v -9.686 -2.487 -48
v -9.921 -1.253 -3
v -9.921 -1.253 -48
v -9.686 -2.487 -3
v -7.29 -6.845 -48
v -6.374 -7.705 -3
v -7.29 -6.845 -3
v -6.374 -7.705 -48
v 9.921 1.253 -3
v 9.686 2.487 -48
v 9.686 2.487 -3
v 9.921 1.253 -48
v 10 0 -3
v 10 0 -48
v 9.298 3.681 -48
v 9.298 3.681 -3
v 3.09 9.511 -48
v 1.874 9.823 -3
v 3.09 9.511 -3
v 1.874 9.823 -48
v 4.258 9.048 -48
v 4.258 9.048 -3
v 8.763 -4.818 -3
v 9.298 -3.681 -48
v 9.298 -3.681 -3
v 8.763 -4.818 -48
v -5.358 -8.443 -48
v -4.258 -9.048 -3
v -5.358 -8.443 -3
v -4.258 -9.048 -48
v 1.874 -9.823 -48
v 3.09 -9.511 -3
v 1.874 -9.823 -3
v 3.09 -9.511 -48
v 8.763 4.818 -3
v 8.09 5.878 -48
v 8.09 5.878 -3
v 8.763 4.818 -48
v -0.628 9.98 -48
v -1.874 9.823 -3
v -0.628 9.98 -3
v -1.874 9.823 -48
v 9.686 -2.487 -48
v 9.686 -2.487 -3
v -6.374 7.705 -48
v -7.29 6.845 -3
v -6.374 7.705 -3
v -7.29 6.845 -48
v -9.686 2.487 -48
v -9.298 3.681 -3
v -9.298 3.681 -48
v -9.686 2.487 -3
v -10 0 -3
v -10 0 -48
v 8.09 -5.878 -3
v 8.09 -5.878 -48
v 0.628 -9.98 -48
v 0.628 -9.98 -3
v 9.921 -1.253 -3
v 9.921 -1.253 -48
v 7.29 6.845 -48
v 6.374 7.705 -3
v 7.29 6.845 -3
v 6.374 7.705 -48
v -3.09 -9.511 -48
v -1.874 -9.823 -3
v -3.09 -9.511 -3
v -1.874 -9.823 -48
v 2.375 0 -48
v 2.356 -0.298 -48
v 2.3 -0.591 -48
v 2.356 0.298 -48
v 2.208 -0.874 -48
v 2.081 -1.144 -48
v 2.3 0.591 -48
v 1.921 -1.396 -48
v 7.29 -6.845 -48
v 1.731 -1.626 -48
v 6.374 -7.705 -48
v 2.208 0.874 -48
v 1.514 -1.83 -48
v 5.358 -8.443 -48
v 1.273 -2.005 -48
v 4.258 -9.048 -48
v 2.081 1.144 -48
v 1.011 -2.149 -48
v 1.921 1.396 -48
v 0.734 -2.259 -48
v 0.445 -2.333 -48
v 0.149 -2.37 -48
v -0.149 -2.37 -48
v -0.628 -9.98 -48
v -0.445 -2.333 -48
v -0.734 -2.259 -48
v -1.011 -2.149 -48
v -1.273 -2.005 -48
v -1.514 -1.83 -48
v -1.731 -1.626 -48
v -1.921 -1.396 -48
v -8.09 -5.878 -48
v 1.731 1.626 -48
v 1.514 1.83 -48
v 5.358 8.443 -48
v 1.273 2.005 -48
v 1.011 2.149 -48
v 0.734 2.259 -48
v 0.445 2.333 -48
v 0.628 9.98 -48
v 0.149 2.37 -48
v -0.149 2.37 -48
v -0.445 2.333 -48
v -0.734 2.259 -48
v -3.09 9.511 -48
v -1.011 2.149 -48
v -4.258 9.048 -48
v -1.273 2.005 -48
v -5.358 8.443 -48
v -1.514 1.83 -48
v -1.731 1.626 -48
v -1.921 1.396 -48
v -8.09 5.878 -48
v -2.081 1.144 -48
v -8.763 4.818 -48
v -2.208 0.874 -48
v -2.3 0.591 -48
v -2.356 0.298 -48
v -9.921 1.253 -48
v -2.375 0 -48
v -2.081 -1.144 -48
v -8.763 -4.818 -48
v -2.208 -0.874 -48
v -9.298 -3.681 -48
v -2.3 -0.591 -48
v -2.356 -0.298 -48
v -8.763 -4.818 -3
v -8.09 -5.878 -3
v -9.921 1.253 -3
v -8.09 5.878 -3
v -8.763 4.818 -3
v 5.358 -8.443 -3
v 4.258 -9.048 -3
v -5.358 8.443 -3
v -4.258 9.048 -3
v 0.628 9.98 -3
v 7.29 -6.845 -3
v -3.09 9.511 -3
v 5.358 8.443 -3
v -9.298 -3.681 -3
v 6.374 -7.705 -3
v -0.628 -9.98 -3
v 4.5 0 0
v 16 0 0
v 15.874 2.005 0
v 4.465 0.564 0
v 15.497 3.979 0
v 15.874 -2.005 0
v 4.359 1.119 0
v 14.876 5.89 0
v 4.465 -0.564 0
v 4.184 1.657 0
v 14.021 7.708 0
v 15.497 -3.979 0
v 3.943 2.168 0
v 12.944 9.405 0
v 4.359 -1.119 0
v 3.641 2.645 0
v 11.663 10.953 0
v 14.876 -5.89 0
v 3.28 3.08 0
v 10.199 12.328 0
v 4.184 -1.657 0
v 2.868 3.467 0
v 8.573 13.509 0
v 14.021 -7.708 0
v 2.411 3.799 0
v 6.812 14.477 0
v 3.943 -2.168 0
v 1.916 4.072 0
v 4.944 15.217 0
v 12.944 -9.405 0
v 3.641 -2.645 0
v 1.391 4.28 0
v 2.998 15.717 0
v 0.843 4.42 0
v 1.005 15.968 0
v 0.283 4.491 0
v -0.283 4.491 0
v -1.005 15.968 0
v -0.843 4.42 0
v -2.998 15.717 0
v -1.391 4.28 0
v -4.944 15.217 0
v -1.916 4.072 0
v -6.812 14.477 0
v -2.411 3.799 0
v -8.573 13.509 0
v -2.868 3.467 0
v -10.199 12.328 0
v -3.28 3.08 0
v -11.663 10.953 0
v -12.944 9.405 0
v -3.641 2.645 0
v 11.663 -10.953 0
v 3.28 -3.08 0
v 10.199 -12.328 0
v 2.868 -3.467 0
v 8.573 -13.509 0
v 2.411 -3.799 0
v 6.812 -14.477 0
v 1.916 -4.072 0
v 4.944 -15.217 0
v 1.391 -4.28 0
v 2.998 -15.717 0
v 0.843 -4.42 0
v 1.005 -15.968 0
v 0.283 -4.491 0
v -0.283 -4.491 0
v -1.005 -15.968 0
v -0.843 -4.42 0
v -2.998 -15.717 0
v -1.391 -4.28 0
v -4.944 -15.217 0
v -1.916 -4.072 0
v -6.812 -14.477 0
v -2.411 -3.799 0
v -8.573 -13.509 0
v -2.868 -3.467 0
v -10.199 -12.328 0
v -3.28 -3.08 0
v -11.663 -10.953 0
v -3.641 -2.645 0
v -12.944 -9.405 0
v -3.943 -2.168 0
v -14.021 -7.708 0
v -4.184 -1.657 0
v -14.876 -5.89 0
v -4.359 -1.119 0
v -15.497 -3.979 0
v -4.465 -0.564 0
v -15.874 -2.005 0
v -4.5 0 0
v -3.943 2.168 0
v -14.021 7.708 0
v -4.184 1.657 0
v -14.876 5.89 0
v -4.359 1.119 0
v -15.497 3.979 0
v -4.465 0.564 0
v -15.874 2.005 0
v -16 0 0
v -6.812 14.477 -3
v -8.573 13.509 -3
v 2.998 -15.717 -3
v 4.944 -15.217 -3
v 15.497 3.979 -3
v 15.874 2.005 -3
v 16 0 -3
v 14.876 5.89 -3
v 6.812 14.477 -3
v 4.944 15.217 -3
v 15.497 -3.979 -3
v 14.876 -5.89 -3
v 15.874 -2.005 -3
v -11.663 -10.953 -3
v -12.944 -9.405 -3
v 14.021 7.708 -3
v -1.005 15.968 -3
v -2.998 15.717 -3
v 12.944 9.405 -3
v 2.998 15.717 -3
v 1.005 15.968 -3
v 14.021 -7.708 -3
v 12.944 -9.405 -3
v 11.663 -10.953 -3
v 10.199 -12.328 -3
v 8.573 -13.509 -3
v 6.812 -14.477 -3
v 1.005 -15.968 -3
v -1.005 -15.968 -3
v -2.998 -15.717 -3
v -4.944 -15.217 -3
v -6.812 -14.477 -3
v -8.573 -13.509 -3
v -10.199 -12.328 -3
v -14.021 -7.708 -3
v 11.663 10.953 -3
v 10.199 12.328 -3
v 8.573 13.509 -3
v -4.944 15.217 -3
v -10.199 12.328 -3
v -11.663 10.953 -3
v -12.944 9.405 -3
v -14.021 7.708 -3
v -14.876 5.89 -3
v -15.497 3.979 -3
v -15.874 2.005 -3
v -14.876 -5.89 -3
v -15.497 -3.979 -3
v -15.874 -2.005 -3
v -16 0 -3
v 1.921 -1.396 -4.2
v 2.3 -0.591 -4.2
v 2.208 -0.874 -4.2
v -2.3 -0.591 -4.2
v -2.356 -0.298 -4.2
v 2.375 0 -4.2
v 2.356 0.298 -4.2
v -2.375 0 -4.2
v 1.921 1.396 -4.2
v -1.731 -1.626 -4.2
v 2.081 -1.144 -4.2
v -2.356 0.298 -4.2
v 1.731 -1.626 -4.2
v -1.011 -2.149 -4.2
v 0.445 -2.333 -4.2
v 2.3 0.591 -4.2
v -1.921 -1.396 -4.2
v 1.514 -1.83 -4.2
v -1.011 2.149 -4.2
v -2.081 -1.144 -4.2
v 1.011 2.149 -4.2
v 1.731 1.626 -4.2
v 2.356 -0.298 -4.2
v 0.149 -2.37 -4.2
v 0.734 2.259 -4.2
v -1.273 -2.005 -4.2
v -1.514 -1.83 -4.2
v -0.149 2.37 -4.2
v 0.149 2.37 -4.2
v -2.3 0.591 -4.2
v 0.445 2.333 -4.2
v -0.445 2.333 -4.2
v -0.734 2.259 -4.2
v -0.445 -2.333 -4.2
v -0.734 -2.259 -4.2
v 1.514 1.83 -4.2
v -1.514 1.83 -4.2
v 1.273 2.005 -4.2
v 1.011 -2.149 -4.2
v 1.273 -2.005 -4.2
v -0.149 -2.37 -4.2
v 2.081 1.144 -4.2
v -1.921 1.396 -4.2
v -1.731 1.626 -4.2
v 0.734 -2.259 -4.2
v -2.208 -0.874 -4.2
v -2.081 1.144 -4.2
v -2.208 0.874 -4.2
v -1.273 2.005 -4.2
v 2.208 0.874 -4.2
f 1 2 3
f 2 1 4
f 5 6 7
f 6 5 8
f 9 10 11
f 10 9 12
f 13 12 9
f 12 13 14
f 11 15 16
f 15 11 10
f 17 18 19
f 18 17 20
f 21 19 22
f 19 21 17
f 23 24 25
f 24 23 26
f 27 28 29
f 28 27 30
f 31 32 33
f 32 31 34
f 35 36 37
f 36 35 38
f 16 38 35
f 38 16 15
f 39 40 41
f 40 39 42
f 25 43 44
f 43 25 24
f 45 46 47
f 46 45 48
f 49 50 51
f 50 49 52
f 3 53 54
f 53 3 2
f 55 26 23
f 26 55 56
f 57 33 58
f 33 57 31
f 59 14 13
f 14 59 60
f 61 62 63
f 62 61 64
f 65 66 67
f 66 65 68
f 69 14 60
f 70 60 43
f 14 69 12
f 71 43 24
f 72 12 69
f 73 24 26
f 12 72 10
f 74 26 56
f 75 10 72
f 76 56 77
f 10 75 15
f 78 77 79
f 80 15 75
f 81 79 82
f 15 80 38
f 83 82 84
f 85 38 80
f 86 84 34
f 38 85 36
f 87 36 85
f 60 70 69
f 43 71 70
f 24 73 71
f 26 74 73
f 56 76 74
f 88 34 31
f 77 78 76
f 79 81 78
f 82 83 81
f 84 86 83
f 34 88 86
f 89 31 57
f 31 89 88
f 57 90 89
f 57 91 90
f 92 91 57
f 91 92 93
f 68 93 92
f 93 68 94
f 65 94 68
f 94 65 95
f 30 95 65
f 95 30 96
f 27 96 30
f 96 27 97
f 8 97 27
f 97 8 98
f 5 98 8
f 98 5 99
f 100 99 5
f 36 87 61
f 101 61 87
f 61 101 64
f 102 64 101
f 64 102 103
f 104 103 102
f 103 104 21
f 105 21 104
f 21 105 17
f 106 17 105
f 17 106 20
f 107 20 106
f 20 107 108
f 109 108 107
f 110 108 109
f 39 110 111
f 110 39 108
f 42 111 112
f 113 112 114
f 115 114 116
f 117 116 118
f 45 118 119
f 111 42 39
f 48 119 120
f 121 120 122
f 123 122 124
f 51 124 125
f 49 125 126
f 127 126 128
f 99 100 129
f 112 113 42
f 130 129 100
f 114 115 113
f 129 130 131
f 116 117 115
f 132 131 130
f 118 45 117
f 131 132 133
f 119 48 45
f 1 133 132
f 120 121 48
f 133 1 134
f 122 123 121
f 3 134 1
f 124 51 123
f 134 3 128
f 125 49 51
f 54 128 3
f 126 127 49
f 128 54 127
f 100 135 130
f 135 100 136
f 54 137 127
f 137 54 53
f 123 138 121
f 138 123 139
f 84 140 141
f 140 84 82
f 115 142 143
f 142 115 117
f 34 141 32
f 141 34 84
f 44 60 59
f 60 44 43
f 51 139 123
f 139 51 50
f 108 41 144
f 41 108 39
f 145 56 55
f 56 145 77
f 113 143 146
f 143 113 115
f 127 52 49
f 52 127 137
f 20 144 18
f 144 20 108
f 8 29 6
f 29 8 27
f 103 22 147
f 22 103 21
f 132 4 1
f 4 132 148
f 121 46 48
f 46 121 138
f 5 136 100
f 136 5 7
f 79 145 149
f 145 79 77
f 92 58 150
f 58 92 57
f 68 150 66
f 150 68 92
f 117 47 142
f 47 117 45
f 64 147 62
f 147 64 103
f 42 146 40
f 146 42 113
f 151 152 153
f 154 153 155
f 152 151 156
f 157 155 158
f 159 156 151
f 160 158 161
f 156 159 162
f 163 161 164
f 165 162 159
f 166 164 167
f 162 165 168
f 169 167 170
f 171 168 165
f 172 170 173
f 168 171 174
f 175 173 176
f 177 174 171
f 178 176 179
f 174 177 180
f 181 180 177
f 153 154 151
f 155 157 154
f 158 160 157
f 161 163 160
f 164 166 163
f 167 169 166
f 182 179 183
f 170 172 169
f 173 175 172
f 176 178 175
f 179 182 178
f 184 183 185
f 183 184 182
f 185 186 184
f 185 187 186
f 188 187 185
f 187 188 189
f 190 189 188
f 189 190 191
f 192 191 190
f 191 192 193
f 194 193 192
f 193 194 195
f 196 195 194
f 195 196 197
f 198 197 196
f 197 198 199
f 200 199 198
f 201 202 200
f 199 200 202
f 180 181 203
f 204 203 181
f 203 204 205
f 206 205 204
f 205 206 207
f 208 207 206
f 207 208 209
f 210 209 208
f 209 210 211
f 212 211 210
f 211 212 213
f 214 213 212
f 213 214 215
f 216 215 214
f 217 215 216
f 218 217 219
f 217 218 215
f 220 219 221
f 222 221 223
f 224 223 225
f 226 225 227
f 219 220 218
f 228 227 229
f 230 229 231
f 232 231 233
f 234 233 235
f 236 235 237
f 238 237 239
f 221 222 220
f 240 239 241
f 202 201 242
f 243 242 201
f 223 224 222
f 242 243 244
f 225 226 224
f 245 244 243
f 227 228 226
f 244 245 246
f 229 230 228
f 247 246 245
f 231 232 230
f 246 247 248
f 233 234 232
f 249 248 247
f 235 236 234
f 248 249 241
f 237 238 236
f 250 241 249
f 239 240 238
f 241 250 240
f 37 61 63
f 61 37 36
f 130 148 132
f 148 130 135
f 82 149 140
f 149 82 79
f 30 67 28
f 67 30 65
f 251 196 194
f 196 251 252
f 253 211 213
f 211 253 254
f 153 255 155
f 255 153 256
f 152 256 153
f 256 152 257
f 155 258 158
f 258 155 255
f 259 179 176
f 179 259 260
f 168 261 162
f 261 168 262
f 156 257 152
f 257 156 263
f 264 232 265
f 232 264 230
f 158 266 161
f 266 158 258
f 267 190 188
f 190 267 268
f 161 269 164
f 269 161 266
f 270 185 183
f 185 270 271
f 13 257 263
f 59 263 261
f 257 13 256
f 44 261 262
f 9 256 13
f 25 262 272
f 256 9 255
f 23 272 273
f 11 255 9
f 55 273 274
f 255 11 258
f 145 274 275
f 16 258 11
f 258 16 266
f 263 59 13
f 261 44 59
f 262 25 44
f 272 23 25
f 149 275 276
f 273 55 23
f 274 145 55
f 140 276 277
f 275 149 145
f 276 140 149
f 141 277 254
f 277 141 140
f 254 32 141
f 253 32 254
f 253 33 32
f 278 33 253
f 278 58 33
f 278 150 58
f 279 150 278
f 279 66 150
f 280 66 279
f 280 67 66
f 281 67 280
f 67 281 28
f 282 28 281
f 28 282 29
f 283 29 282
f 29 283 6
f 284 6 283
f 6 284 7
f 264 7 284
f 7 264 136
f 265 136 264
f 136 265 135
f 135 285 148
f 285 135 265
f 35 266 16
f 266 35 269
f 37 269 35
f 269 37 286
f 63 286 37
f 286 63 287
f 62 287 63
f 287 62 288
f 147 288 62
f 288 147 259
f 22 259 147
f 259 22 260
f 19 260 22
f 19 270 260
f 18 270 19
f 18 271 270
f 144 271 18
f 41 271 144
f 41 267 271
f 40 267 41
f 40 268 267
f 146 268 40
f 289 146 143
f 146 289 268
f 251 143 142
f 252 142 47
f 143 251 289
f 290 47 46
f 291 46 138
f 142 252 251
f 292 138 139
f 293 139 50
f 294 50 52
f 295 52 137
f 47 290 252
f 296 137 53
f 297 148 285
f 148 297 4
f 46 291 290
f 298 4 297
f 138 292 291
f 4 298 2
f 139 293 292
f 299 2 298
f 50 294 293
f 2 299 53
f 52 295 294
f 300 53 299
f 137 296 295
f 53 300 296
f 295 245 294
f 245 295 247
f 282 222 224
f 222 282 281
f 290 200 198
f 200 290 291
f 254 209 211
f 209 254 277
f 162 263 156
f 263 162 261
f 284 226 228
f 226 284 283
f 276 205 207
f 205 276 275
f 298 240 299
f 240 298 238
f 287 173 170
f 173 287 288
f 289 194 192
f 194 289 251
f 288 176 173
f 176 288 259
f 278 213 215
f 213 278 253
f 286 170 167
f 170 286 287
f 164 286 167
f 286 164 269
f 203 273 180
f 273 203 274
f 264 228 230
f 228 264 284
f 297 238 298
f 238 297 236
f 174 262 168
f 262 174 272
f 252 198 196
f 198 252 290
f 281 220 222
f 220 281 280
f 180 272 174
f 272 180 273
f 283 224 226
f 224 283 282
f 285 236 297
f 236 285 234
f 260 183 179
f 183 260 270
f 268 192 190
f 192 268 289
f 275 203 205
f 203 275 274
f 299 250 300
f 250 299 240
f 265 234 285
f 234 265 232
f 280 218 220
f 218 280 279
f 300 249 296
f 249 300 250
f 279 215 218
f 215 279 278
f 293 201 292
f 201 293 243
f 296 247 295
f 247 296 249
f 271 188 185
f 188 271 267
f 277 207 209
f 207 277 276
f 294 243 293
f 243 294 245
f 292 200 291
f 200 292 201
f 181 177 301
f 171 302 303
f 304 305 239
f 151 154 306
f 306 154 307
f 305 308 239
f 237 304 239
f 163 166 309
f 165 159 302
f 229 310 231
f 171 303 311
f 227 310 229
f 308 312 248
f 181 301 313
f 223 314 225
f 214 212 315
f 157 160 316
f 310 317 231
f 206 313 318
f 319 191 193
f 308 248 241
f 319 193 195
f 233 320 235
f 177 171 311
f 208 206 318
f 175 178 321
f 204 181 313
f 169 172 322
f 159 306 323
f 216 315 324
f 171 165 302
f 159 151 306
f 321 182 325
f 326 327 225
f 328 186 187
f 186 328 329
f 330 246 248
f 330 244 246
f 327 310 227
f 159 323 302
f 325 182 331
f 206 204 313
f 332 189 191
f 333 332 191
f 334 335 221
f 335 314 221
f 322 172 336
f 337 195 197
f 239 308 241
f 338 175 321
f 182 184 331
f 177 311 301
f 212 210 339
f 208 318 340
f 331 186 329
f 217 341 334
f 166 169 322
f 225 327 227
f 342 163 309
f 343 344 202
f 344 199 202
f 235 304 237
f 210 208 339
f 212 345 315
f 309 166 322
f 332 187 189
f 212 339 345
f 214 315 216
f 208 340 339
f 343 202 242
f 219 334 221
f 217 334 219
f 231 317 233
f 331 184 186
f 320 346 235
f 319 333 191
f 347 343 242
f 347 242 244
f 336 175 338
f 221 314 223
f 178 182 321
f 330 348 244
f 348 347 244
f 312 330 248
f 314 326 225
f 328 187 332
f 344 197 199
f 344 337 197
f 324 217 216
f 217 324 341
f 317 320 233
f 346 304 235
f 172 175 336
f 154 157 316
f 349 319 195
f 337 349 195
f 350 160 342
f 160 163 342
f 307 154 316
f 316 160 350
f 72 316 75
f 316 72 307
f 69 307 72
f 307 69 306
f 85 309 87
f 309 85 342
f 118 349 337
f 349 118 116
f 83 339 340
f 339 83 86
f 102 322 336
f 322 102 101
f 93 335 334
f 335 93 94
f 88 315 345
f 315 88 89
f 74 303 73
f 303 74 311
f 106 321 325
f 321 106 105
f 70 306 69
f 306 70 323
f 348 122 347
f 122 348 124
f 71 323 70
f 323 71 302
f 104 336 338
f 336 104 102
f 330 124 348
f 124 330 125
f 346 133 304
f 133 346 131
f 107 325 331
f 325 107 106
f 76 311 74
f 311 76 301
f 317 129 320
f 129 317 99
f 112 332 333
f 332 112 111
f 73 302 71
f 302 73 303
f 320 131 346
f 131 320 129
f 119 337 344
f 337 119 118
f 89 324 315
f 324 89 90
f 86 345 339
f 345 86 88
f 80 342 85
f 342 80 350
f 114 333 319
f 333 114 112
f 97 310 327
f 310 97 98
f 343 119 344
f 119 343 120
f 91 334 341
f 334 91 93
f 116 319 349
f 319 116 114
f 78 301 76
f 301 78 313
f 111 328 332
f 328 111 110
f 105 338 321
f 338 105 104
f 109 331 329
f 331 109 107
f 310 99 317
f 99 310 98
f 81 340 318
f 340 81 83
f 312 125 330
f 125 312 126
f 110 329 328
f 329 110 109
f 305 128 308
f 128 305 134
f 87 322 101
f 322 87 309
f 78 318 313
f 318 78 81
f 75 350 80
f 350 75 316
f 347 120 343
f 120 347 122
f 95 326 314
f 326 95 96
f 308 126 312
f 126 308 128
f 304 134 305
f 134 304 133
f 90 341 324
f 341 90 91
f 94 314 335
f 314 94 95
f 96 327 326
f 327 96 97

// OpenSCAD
$fn = 50;


difference() {
	union() {
		translate(v = [0, 0, -48.0000000000]) {
			cylinder(h = 48, r = 10.0000000000);
		}
		translate(v = [0, 0, -3.0000000000]) {
			cylinder(h = 3, r = 16.0000000000);
		}
	}
	union() {
		translate(v = [0, 0, 0]) {
			rotate(a = [0, 0, 0]) {
				difference() {
					union() {
						#translate(v = [0, 0, -48.0000000000]) {
							cylinder(h = 48, r = 2.2500000000);
						}
						#translate(v = [0, 0, -4.2000000000]) {
							cylinder(h = 4.2000000000, r = 10.0000000000, r1 = 2.3750000000, r2 = 4.5000000000);
						}
						#translate(v = [0, 0, -48.0000000000]) {
							cylinder(h = 48, r = 2.3750000000);
						}
						#translate(v = [0, 0, -48.0000000000]) {
							cylinder(h = 48, r = 2.2500000000);
						}
					}
					union();
				}
			}
		}
	}
}
